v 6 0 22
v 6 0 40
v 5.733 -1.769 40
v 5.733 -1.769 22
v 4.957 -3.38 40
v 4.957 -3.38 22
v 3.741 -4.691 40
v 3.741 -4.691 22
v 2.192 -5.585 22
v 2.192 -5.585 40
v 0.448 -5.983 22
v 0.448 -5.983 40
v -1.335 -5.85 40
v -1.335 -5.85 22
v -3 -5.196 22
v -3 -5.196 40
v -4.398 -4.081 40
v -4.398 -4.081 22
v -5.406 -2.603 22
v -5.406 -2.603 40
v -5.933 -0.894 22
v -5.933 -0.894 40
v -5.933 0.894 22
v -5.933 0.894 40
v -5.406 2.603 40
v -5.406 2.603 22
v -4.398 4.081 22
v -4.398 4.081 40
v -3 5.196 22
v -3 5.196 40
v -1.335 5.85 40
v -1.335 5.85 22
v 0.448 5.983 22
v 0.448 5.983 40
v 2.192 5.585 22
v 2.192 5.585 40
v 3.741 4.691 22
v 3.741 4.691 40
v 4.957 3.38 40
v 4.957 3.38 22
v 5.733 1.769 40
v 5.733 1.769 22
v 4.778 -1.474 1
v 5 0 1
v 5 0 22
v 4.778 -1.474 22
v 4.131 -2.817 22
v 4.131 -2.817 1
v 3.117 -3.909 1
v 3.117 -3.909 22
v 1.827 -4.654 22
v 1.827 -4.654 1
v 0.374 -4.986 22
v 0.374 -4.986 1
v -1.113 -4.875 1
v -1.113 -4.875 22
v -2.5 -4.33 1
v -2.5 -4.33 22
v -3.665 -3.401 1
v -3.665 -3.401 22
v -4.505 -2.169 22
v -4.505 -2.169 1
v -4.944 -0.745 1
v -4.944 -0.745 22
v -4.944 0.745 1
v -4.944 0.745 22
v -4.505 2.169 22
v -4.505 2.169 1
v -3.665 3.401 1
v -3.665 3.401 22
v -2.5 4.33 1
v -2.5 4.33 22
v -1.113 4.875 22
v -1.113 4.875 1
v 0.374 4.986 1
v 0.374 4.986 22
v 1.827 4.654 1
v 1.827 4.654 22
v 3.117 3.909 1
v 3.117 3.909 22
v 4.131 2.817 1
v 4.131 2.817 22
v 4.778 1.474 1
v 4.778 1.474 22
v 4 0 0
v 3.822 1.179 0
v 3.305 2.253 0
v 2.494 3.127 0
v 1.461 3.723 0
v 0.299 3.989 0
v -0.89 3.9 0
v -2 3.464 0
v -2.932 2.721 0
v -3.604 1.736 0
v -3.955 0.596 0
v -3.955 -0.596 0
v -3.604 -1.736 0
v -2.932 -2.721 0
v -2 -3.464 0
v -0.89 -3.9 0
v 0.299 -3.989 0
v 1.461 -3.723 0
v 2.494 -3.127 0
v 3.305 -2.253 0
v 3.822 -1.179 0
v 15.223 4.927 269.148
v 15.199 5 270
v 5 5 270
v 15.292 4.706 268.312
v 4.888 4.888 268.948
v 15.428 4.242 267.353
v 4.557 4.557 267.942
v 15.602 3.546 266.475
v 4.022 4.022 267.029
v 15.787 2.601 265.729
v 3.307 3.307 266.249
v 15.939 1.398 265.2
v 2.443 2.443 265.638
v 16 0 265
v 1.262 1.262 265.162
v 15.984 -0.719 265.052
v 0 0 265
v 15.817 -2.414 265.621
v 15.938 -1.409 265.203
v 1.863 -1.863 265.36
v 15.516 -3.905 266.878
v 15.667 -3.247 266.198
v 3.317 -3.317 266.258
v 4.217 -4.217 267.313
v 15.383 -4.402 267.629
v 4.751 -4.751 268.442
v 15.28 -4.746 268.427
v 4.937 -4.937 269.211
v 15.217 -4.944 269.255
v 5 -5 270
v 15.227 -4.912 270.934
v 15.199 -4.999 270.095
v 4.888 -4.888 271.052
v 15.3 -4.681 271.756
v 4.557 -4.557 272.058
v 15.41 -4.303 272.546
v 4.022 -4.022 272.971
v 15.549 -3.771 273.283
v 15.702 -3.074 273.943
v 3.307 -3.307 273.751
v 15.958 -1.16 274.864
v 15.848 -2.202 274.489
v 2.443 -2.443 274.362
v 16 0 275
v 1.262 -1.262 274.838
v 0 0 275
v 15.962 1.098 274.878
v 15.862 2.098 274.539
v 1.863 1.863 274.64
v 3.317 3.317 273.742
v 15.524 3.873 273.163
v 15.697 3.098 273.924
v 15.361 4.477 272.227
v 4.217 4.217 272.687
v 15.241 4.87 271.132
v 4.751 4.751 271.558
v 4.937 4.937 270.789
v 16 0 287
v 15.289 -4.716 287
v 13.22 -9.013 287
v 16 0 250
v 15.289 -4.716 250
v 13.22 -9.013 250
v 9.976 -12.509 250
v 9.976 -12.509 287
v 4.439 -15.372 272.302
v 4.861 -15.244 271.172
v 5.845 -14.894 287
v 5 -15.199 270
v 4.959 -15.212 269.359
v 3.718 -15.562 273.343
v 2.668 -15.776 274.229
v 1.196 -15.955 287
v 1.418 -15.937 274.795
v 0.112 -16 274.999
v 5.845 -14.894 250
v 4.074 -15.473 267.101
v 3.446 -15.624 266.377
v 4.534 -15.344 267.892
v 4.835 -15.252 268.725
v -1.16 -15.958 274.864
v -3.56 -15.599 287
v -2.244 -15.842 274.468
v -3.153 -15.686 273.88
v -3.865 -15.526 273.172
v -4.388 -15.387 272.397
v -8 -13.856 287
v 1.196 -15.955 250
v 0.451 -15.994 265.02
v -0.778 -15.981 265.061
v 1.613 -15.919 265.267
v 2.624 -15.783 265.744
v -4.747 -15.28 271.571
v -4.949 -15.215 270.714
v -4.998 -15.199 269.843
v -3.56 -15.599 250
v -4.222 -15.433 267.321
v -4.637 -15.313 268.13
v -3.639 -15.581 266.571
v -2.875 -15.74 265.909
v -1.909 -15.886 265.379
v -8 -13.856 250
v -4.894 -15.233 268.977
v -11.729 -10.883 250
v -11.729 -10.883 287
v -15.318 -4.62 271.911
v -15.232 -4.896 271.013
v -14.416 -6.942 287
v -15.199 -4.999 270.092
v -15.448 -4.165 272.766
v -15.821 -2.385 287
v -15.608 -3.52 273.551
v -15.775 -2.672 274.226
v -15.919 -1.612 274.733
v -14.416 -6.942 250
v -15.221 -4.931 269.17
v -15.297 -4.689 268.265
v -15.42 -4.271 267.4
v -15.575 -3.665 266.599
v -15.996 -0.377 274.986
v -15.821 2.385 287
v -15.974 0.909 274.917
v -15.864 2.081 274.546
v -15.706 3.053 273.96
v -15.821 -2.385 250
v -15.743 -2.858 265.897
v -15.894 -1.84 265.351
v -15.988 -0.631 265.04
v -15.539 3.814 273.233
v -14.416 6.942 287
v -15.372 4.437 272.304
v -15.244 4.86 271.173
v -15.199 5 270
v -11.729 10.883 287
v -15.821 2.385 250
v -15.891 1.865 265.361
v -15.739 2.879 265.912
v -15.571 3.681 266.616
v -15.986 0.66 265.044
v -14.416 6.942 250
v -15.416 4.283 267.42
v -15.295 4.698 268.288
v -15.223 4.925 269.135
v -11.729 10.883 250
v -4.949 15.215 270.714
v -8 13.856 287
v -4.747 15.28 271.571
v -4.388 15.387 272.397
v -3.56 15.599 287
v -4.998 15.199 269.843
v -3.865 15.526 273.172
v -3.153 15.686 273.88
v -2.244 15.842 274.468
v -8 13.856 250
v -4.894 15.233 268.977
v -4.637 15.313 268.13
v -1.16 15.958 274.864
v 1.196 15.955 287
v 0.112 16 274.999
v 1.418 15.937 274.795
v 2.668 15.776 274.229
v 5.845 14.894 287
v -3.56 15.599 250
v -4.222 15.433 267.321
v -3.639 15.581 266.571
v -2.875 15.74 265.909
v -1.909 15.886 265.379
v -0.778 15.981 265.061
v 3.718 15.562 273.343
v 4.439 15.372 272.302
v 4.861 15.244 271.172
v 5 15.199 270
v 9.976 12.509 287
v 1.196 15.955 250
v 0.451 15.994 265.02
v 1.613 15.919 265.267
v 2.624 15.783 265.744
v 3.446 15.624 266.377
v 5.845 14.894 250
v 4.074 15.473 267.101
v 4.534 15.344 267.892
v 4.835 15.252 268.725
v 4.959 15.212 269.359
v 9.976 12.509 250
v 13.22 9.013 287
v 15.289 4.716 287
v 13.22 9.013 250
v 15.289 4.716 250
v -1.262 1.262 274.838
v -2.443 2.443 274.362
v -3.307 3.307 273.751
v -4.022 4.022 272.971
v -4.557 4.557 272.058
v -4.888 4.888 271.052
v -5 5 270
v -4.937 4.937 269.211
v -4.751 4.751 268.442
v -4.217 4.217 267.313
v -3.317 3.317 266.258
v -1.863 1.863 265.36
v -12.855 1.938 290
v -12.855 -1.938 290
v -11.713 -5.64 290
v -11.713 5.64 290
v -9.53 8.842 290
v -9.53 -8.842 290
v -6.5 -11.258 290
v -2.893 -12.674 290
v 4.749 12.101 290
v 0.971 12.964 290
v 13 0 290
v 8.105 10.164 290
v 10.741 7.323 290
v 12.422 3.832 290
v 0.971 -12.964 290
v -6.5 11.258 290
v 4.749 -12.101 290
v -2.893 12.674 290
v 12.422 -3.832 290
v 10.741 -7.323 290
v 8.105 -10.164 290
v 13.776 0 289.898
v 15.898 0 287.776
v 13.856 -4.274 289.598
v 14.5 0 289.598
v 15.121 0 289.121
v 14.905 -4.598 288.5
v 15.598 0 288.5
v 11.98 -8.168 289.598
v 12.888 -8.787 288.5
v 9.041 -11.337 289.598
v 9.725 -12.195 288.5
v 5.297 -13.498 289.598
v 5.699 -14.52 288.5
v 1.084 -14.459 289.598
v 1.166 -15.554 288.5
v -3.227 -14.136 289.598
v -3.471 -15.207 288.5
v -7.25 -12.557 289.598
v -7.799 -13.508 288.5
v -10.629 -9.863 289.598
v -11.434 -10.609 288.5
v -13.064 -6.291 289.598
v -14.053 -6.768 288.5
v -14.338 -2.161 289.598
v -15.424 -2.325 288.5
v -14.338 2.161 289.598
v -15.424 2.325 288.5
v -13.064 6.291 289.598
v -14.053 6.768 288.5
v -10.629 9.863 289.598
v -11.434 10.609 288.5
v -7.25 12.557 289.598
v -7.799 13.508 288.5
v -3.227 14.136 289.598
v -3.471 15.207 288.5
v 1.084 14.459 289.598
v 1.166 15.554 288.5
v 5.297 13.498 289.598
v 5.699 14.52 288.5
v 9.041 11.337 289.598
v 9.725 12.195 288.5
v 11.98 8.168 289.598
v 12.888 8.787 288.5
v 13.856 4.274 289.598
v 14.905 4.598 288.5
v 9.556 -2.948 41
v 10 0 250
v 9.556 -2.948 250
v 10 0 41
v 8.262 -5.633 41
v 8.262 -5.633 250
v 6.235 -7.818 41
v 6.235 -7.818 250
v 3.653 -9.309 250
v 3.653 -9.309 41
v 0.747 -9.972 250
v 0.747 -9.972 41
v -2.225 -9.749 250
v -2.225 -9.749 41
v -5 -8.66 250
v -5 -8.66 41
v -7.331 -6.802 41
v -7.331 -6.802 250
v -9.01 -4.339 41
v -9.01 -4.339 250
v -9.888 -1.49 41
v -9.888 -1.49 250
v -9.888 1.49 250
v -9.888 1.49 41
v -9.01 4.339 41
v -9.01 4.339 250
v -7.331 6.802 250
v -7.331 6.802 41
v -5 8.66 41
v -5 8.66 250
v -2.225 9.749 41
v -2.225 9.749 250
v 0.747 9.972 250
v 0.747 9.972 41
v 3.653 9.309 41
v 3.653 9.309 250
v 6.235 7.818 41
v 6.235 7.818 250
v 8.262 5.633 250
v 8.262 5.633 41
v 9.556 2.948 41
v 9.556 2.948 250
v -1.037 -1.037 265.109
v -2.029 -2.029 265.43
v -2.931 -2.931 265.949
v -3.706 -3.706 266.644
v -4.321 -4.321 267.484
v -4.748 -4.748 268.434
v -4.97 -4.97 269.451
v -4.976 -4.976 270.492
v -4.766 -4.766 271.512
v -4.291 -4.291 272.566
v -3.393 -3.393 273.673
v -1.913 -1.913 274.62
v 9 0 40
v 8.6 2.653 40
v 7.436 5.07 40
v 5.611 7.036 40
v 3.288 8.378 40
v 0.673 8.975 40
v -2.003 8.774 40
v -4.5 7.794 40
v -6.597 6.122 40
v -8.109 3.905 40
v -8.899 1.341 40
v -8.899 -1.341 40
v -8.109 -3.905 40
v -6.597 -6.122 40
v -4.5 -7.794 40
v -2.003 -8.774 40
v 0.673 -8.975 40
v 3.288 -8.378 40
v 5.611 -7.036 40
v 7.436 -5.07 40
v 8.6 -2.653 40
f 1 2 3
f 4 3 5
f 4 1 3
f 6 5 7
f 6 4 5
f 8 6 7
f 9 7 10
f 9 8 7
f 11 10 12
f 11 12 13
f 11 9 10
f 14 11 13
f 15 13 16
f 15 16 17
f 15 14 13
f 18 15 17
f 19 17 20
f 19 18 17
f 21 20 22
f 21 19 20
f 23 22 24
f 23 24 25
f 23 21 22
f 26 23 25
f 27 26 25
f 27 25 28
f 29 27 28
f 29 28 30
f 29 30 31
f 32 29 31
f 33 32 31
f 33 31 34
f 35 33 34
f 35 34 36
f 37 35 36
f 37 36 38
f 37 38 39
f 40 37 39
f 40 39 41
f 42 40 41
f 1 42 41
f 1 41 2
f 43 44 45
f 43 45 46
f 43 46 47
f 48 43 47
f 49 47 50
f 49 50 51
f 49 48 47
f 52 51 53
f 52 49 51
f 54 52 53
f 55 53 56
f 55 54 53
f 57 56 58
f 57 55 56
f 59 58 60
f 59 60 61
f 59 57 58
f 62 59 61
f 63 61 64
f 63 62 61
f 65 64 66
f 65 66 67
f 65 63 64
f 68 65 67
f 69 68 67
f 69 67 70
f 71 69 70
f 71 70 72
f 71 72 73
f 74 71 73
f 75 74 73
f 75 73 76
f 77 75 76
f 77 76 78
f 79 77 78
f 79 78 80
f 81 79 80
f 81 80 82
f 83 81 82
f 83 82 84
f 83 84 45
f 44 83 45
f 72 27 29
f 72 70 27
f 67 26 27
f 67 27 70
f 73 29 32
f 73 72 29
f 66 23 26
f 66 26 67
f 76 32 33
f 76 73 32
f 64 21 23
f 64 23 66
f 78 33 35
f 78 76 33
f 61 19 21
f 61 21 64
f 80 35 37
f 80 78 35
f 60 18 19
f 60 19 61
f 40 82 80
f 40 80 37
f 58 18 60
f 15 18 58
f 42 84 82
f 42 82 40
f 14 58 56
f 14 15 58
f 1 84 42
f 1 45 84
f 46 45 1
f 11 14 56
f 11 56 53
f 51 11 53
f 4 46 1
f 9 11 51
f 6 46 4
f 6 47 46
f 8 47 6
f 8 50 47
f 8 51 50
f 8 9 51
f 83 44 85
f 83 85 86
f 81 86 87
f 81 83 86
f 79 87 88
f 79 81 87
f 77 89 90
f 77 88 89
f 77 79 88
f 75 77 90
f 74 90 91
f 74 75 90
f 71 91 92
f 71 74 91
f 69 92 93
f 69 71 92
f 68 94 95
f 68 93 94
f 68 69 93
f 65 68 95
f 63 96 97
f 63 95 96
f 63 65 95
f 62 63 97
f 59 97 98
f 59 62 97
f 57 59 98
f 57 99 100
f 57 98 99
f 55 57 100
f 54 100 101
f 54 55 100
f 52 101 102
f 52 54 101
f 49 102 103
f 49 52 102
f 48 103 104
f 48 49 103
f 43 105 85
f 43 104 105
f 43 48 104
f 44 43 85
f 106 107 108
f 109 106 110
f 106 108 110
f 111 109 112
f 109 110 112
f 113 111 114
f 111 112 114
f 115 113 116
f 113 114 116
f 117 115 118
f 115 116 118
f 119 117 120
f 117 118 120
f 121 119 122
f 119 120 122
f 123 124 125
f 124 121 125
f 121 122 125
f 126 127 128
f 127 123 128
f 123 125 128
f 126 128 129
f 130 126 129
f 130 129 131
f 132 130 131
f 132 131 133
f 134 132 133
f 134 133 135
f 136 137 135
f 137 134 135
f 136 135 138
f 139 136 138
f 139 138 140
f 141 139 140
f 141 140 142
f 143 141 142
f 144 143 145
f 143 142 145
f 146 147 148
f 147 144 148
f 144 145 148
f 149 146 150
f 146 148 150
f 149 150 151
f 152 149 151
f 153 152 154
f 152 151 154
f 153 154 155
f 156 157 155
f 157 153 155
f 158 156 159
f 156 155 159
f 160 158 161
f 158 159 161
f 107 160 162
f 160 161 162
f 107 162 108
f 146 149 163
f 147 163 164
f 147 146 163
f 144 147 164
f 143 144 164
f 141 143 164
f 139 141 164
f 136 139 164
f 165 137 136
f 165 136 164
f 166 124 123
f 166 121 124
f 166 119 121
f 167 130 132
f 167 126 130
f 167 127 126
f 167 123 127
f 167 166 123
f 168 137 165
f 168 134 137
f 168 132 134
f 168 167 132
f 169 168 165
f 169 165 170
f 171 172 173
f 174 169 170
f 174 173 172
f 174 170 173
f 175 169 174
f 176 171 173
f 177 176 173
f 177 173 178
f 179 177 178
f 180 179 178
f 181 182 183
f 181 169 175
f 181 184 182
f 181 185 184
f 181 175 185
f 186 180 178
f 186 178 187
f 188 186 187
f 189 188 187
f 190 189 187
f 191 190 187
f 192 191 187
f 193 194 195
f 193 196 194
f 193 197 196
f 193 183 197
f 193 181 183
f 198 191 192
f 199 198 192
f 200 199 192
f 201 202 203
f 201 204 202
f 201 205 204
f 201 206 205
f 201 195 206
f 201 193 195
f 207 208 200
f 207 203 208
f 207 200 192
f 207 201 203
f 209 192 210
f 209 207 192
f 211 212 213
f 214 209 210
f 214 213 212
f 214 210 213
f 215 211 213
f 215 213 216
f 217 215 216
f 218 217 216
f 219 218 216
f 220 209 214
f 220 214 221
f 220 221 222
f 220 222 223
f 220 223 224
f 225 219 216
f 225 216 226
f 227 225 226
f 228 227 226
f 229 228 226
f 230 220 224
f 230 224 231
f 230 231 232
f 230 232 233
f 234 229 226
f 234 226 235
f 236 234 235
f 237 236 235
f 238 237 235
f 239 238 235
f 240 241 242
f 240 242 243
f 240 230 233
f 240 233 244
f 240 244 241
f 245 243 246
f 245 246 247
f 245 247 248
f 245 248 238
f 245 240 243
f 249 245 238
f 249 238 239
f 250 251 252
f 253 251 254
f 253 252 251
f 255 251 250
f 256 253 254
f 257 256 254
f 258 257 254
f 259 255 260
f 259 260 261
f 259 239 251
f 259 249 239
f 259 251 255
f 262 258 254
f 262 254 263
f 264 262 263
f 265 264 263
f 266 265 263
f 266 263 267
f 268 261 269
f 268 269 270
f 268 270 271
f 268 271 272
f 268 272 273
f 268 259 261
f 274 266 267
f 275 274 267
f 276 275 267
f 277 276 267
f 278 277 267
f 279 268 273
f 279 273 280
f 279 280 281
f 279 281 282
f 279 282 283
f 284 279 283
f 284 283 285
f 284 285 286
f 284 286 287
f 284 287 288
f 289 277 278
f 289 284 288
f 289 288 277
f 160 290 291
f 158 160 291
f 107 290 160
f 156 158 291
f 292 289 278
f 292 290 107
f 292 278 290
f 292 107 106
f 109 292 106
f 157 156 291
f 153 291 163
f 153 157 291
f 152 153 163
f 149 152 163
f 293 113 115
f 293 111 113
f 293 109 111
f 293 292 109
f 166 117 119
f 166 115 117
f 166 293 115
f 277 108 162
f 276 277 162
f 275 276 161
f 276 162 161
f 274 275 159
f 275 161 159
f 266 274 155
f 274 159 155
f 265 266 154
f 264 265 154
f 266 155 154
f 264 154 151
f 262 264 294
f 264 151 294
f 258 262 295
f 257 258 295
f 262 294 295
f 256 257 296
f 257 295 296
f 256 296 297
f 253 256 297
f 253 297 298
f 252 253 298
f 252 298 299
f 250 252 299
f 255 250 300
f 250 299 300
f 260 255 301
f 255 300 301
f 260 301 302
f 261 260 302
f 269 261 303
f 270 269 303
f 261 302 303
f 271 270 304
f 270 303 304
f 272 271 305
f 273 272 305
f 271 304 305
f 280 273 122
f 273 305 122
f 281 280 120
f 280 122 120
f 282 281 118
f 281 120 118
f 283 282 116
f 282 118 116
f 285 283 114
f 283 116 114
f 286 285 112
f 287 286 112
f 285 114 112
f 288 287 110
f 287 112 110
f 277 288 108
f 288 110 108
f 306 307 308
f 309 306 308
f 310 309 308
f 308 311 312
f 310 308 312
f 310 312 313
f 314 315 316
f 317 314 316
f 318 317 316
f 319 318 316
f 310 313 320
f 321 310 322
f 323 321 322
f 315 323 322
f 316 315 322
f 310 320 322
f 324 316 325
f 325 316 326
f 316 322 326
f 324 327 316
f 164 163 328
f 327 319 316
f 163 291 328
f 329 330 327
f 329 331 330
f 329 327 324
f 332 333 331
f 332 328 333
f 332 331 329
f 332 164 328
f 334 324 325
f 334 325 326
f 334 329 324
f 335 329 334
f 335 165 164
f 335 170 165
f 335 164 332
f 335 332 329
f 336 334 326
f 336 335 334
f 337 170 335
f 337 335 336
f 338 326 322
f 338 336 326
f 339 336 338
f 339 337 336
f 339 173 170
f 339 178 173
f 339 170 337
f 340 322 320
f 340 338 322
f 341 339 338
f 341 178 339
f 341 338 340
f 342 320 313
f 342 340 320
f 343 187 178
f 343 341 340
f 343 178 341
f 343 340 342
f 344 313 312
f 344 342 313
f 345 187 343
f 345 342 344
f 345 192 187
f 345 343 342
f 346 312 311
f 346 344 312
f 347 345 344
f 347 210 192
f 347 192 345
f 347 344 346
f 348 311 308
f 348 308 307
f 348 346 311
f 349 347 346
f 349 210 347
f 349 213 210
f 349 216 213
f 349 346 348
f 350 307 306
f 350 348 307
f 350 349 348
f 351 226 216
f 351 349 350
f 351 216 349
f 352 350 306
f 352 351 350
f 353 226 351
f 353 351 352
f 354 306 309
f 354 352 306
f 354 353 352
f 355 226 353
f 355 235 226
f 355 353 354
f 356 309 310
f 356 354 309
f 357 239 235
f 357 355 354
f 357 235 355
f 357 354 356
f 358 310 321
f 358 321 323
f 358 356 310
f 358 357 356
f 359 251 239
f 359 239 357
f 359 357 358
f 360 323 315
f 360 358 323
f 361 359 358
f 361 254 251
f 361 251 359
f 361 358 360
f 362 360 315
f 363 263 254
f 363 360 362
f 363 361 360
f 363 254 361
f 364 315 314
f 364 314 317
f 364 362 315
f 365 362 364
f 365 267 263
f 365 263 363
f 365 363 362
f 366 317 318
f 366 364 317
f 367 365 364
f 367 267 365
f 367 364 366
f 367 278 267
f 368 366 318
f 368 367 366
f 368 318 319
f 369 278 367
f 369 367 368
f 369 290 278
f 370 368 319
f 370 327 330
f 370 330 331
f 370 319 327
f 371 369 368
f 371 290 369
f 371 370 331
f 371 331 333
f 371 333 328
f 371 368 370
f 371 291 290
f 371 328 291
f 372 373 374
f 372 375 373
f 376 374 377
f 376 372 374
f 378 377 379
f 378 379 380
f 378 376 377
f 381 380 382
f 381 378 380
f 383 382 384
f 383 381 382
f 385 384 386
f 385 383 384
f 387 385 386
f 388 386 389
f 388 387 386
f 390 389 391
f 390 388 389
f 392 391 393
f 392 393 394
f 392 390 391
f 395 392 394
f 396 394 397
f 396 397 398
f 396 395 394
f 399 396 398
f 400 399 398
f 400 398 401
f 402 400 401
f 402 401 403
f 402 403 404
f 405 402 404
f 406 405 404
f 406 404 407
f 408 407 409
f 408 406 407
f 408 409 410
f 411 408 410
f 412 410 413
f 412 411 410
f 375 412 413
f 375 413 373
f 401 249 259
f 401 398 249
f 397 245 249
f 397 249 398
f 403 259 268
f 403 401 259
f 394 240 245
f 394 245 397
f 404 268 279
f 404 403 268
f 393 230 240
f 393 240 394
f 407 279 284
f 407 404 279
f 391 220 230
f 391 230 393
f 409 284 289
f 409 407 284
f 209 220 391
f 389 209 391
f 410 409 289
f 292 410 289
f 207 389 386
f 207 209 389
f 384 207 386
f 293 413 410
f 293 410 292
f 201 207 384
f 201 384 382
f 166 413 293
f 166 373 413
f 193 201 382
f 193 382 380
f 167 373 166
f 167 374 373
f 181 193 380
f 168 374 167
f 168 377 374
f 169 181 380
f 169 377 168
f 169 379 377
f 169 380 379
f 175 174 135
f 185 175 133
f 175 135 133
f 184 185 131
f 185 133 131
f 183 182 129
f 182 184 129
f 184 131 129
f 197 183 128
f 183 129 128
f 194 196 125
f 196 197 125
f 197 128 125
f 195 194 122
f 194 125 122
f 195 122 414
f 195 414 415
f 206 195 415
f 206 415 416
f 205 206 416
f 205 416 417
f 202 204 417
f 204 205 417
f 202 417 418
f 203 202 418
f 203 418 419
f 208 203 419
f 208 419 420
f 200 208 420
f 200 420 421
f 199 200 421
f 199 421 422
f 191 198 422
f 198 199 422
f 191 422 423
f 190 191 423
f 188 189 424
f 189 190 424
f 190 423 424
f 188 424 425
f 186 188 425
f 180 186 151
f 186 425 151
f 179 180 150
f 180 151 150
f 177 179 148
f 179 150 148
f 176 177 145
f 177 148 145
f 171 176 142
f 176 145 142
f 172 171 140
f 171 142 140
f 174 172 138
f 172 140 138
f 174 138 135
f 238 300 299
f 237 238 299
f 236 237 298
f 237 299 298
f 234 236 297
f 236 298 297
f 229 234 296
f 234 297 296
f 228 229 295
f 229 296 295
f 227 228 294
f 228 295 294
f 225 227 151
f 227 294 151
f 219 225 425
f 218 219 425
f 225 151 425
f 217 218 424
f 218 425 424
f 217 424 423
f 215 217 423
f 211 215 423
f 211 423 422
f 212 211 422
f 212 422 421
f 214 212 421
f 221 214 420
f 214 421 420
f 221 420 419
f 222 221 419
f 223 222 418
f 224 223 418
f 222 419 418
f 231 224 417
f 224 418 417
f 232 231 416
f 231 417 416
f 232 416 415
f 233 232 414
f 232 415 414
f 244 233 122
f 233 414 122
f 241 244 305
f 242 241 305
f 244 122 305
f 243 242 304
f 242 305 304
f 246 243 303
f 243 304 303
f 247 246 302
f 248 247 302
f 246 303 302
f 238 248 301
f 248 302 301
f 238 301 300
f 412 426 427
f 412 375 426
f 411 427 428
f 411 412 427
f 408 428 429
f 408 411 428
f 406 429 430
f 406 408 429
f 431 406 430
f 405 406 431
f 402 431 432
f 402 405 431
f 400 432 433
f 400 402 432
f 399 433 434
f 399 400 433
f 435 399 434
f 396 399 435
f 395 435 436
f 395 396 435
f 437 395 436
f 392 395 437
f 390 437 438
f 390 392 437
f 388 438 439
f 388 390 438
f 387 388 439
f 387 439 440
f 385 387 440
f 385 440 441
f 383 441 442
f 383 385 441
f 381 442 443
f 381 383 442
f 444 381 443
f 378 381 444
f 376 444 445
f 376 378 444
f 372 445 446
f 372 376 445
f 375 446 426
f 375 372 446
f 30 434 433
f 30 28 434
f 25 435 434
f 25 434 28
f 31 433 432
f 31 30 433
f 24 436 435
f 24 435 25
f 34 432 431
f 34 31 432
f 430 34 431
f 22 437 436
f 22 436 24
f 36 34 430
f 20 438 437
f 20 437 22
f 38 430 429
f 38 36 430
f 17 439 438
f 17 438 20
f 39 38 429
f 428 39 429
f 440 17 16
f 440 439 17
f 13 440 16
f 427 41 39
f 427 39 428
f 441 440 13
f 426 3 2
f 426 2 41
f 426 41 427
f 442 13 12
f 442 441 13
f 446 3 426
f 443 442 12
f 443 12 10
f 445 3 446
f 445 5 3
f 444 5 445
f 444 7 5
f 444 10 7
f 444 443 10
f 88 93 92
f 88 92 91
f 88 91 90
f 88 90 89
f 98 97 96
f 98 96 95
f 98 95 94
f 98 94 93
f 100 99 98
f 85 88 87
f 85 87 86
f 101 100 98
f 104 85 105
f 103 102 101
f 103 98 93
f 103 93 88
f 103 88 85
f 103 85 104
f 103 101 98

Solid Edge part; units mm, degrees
sketch "Sketch1" plane through (0, 0, 0) normal (0, -1, 0) x (1, 0, 0)
  line L0 (0, 0) -> (0, 290)
  line L1 (0, 290) -> (16, 290)
  line L2 (16, 290) -> (16, 250)
  line L3 (16, 250) -> (10, 250)
  line L4 (10, 250) -> (10, 40)
  line L5 (10, 40) -> (6, 40)
  line L6 (6, 40) -> (6, 22)
  line L7 (6, 22) -> (5, 22)
  line L8 (5, 22) -> (5, 0)
  line L9 (5, 0) -> (0, 0)
  dimension "D1" = 210
  dimension "D2" = 40
  dimension "D3" = 290
  dimension "D4" = 22
  dimension "D5" = 18
revolve "RevolvedProtrusion1" add sketch "Sketch1" angle 360 about axis through (0, 0, 54) along (0, 0, -1)
sketch "Sketch2" plane through (0, 0, 0) normal (1, 0, 0) x (0, 1, 0)
  circle A0 centre (0, 270) radius 5
extrude "Cutout1" cut sketch "Sketch2" along normal mid plane 303.6008
sketch "Sketch3" plane through (0, 0, 0) normal (0, -1, 0) x (1, 0, 0)
  circle A0 centre (0, 270) radius 5
extrude "ExtrudedCutout_2" cut sketch "Sketch3" along normal mid plane 286.0793
fillet "Round_1" radius 3 1 edges at (-16, 0, 290)
cosmetic_thread "Thread_1" size "Tr 20 x 4" thread depth 170
cosmetic_thread "Thread1" size "Tr 10 x 2"
chamfer "Chamfer_1" distance 1 angle 45 1 edges at (-10, 0, 40)
chamfer "Chamfer_2" distance 1 angle 45 1 edges at (-5, 0, 0)
properties material "Fe 410 W"
